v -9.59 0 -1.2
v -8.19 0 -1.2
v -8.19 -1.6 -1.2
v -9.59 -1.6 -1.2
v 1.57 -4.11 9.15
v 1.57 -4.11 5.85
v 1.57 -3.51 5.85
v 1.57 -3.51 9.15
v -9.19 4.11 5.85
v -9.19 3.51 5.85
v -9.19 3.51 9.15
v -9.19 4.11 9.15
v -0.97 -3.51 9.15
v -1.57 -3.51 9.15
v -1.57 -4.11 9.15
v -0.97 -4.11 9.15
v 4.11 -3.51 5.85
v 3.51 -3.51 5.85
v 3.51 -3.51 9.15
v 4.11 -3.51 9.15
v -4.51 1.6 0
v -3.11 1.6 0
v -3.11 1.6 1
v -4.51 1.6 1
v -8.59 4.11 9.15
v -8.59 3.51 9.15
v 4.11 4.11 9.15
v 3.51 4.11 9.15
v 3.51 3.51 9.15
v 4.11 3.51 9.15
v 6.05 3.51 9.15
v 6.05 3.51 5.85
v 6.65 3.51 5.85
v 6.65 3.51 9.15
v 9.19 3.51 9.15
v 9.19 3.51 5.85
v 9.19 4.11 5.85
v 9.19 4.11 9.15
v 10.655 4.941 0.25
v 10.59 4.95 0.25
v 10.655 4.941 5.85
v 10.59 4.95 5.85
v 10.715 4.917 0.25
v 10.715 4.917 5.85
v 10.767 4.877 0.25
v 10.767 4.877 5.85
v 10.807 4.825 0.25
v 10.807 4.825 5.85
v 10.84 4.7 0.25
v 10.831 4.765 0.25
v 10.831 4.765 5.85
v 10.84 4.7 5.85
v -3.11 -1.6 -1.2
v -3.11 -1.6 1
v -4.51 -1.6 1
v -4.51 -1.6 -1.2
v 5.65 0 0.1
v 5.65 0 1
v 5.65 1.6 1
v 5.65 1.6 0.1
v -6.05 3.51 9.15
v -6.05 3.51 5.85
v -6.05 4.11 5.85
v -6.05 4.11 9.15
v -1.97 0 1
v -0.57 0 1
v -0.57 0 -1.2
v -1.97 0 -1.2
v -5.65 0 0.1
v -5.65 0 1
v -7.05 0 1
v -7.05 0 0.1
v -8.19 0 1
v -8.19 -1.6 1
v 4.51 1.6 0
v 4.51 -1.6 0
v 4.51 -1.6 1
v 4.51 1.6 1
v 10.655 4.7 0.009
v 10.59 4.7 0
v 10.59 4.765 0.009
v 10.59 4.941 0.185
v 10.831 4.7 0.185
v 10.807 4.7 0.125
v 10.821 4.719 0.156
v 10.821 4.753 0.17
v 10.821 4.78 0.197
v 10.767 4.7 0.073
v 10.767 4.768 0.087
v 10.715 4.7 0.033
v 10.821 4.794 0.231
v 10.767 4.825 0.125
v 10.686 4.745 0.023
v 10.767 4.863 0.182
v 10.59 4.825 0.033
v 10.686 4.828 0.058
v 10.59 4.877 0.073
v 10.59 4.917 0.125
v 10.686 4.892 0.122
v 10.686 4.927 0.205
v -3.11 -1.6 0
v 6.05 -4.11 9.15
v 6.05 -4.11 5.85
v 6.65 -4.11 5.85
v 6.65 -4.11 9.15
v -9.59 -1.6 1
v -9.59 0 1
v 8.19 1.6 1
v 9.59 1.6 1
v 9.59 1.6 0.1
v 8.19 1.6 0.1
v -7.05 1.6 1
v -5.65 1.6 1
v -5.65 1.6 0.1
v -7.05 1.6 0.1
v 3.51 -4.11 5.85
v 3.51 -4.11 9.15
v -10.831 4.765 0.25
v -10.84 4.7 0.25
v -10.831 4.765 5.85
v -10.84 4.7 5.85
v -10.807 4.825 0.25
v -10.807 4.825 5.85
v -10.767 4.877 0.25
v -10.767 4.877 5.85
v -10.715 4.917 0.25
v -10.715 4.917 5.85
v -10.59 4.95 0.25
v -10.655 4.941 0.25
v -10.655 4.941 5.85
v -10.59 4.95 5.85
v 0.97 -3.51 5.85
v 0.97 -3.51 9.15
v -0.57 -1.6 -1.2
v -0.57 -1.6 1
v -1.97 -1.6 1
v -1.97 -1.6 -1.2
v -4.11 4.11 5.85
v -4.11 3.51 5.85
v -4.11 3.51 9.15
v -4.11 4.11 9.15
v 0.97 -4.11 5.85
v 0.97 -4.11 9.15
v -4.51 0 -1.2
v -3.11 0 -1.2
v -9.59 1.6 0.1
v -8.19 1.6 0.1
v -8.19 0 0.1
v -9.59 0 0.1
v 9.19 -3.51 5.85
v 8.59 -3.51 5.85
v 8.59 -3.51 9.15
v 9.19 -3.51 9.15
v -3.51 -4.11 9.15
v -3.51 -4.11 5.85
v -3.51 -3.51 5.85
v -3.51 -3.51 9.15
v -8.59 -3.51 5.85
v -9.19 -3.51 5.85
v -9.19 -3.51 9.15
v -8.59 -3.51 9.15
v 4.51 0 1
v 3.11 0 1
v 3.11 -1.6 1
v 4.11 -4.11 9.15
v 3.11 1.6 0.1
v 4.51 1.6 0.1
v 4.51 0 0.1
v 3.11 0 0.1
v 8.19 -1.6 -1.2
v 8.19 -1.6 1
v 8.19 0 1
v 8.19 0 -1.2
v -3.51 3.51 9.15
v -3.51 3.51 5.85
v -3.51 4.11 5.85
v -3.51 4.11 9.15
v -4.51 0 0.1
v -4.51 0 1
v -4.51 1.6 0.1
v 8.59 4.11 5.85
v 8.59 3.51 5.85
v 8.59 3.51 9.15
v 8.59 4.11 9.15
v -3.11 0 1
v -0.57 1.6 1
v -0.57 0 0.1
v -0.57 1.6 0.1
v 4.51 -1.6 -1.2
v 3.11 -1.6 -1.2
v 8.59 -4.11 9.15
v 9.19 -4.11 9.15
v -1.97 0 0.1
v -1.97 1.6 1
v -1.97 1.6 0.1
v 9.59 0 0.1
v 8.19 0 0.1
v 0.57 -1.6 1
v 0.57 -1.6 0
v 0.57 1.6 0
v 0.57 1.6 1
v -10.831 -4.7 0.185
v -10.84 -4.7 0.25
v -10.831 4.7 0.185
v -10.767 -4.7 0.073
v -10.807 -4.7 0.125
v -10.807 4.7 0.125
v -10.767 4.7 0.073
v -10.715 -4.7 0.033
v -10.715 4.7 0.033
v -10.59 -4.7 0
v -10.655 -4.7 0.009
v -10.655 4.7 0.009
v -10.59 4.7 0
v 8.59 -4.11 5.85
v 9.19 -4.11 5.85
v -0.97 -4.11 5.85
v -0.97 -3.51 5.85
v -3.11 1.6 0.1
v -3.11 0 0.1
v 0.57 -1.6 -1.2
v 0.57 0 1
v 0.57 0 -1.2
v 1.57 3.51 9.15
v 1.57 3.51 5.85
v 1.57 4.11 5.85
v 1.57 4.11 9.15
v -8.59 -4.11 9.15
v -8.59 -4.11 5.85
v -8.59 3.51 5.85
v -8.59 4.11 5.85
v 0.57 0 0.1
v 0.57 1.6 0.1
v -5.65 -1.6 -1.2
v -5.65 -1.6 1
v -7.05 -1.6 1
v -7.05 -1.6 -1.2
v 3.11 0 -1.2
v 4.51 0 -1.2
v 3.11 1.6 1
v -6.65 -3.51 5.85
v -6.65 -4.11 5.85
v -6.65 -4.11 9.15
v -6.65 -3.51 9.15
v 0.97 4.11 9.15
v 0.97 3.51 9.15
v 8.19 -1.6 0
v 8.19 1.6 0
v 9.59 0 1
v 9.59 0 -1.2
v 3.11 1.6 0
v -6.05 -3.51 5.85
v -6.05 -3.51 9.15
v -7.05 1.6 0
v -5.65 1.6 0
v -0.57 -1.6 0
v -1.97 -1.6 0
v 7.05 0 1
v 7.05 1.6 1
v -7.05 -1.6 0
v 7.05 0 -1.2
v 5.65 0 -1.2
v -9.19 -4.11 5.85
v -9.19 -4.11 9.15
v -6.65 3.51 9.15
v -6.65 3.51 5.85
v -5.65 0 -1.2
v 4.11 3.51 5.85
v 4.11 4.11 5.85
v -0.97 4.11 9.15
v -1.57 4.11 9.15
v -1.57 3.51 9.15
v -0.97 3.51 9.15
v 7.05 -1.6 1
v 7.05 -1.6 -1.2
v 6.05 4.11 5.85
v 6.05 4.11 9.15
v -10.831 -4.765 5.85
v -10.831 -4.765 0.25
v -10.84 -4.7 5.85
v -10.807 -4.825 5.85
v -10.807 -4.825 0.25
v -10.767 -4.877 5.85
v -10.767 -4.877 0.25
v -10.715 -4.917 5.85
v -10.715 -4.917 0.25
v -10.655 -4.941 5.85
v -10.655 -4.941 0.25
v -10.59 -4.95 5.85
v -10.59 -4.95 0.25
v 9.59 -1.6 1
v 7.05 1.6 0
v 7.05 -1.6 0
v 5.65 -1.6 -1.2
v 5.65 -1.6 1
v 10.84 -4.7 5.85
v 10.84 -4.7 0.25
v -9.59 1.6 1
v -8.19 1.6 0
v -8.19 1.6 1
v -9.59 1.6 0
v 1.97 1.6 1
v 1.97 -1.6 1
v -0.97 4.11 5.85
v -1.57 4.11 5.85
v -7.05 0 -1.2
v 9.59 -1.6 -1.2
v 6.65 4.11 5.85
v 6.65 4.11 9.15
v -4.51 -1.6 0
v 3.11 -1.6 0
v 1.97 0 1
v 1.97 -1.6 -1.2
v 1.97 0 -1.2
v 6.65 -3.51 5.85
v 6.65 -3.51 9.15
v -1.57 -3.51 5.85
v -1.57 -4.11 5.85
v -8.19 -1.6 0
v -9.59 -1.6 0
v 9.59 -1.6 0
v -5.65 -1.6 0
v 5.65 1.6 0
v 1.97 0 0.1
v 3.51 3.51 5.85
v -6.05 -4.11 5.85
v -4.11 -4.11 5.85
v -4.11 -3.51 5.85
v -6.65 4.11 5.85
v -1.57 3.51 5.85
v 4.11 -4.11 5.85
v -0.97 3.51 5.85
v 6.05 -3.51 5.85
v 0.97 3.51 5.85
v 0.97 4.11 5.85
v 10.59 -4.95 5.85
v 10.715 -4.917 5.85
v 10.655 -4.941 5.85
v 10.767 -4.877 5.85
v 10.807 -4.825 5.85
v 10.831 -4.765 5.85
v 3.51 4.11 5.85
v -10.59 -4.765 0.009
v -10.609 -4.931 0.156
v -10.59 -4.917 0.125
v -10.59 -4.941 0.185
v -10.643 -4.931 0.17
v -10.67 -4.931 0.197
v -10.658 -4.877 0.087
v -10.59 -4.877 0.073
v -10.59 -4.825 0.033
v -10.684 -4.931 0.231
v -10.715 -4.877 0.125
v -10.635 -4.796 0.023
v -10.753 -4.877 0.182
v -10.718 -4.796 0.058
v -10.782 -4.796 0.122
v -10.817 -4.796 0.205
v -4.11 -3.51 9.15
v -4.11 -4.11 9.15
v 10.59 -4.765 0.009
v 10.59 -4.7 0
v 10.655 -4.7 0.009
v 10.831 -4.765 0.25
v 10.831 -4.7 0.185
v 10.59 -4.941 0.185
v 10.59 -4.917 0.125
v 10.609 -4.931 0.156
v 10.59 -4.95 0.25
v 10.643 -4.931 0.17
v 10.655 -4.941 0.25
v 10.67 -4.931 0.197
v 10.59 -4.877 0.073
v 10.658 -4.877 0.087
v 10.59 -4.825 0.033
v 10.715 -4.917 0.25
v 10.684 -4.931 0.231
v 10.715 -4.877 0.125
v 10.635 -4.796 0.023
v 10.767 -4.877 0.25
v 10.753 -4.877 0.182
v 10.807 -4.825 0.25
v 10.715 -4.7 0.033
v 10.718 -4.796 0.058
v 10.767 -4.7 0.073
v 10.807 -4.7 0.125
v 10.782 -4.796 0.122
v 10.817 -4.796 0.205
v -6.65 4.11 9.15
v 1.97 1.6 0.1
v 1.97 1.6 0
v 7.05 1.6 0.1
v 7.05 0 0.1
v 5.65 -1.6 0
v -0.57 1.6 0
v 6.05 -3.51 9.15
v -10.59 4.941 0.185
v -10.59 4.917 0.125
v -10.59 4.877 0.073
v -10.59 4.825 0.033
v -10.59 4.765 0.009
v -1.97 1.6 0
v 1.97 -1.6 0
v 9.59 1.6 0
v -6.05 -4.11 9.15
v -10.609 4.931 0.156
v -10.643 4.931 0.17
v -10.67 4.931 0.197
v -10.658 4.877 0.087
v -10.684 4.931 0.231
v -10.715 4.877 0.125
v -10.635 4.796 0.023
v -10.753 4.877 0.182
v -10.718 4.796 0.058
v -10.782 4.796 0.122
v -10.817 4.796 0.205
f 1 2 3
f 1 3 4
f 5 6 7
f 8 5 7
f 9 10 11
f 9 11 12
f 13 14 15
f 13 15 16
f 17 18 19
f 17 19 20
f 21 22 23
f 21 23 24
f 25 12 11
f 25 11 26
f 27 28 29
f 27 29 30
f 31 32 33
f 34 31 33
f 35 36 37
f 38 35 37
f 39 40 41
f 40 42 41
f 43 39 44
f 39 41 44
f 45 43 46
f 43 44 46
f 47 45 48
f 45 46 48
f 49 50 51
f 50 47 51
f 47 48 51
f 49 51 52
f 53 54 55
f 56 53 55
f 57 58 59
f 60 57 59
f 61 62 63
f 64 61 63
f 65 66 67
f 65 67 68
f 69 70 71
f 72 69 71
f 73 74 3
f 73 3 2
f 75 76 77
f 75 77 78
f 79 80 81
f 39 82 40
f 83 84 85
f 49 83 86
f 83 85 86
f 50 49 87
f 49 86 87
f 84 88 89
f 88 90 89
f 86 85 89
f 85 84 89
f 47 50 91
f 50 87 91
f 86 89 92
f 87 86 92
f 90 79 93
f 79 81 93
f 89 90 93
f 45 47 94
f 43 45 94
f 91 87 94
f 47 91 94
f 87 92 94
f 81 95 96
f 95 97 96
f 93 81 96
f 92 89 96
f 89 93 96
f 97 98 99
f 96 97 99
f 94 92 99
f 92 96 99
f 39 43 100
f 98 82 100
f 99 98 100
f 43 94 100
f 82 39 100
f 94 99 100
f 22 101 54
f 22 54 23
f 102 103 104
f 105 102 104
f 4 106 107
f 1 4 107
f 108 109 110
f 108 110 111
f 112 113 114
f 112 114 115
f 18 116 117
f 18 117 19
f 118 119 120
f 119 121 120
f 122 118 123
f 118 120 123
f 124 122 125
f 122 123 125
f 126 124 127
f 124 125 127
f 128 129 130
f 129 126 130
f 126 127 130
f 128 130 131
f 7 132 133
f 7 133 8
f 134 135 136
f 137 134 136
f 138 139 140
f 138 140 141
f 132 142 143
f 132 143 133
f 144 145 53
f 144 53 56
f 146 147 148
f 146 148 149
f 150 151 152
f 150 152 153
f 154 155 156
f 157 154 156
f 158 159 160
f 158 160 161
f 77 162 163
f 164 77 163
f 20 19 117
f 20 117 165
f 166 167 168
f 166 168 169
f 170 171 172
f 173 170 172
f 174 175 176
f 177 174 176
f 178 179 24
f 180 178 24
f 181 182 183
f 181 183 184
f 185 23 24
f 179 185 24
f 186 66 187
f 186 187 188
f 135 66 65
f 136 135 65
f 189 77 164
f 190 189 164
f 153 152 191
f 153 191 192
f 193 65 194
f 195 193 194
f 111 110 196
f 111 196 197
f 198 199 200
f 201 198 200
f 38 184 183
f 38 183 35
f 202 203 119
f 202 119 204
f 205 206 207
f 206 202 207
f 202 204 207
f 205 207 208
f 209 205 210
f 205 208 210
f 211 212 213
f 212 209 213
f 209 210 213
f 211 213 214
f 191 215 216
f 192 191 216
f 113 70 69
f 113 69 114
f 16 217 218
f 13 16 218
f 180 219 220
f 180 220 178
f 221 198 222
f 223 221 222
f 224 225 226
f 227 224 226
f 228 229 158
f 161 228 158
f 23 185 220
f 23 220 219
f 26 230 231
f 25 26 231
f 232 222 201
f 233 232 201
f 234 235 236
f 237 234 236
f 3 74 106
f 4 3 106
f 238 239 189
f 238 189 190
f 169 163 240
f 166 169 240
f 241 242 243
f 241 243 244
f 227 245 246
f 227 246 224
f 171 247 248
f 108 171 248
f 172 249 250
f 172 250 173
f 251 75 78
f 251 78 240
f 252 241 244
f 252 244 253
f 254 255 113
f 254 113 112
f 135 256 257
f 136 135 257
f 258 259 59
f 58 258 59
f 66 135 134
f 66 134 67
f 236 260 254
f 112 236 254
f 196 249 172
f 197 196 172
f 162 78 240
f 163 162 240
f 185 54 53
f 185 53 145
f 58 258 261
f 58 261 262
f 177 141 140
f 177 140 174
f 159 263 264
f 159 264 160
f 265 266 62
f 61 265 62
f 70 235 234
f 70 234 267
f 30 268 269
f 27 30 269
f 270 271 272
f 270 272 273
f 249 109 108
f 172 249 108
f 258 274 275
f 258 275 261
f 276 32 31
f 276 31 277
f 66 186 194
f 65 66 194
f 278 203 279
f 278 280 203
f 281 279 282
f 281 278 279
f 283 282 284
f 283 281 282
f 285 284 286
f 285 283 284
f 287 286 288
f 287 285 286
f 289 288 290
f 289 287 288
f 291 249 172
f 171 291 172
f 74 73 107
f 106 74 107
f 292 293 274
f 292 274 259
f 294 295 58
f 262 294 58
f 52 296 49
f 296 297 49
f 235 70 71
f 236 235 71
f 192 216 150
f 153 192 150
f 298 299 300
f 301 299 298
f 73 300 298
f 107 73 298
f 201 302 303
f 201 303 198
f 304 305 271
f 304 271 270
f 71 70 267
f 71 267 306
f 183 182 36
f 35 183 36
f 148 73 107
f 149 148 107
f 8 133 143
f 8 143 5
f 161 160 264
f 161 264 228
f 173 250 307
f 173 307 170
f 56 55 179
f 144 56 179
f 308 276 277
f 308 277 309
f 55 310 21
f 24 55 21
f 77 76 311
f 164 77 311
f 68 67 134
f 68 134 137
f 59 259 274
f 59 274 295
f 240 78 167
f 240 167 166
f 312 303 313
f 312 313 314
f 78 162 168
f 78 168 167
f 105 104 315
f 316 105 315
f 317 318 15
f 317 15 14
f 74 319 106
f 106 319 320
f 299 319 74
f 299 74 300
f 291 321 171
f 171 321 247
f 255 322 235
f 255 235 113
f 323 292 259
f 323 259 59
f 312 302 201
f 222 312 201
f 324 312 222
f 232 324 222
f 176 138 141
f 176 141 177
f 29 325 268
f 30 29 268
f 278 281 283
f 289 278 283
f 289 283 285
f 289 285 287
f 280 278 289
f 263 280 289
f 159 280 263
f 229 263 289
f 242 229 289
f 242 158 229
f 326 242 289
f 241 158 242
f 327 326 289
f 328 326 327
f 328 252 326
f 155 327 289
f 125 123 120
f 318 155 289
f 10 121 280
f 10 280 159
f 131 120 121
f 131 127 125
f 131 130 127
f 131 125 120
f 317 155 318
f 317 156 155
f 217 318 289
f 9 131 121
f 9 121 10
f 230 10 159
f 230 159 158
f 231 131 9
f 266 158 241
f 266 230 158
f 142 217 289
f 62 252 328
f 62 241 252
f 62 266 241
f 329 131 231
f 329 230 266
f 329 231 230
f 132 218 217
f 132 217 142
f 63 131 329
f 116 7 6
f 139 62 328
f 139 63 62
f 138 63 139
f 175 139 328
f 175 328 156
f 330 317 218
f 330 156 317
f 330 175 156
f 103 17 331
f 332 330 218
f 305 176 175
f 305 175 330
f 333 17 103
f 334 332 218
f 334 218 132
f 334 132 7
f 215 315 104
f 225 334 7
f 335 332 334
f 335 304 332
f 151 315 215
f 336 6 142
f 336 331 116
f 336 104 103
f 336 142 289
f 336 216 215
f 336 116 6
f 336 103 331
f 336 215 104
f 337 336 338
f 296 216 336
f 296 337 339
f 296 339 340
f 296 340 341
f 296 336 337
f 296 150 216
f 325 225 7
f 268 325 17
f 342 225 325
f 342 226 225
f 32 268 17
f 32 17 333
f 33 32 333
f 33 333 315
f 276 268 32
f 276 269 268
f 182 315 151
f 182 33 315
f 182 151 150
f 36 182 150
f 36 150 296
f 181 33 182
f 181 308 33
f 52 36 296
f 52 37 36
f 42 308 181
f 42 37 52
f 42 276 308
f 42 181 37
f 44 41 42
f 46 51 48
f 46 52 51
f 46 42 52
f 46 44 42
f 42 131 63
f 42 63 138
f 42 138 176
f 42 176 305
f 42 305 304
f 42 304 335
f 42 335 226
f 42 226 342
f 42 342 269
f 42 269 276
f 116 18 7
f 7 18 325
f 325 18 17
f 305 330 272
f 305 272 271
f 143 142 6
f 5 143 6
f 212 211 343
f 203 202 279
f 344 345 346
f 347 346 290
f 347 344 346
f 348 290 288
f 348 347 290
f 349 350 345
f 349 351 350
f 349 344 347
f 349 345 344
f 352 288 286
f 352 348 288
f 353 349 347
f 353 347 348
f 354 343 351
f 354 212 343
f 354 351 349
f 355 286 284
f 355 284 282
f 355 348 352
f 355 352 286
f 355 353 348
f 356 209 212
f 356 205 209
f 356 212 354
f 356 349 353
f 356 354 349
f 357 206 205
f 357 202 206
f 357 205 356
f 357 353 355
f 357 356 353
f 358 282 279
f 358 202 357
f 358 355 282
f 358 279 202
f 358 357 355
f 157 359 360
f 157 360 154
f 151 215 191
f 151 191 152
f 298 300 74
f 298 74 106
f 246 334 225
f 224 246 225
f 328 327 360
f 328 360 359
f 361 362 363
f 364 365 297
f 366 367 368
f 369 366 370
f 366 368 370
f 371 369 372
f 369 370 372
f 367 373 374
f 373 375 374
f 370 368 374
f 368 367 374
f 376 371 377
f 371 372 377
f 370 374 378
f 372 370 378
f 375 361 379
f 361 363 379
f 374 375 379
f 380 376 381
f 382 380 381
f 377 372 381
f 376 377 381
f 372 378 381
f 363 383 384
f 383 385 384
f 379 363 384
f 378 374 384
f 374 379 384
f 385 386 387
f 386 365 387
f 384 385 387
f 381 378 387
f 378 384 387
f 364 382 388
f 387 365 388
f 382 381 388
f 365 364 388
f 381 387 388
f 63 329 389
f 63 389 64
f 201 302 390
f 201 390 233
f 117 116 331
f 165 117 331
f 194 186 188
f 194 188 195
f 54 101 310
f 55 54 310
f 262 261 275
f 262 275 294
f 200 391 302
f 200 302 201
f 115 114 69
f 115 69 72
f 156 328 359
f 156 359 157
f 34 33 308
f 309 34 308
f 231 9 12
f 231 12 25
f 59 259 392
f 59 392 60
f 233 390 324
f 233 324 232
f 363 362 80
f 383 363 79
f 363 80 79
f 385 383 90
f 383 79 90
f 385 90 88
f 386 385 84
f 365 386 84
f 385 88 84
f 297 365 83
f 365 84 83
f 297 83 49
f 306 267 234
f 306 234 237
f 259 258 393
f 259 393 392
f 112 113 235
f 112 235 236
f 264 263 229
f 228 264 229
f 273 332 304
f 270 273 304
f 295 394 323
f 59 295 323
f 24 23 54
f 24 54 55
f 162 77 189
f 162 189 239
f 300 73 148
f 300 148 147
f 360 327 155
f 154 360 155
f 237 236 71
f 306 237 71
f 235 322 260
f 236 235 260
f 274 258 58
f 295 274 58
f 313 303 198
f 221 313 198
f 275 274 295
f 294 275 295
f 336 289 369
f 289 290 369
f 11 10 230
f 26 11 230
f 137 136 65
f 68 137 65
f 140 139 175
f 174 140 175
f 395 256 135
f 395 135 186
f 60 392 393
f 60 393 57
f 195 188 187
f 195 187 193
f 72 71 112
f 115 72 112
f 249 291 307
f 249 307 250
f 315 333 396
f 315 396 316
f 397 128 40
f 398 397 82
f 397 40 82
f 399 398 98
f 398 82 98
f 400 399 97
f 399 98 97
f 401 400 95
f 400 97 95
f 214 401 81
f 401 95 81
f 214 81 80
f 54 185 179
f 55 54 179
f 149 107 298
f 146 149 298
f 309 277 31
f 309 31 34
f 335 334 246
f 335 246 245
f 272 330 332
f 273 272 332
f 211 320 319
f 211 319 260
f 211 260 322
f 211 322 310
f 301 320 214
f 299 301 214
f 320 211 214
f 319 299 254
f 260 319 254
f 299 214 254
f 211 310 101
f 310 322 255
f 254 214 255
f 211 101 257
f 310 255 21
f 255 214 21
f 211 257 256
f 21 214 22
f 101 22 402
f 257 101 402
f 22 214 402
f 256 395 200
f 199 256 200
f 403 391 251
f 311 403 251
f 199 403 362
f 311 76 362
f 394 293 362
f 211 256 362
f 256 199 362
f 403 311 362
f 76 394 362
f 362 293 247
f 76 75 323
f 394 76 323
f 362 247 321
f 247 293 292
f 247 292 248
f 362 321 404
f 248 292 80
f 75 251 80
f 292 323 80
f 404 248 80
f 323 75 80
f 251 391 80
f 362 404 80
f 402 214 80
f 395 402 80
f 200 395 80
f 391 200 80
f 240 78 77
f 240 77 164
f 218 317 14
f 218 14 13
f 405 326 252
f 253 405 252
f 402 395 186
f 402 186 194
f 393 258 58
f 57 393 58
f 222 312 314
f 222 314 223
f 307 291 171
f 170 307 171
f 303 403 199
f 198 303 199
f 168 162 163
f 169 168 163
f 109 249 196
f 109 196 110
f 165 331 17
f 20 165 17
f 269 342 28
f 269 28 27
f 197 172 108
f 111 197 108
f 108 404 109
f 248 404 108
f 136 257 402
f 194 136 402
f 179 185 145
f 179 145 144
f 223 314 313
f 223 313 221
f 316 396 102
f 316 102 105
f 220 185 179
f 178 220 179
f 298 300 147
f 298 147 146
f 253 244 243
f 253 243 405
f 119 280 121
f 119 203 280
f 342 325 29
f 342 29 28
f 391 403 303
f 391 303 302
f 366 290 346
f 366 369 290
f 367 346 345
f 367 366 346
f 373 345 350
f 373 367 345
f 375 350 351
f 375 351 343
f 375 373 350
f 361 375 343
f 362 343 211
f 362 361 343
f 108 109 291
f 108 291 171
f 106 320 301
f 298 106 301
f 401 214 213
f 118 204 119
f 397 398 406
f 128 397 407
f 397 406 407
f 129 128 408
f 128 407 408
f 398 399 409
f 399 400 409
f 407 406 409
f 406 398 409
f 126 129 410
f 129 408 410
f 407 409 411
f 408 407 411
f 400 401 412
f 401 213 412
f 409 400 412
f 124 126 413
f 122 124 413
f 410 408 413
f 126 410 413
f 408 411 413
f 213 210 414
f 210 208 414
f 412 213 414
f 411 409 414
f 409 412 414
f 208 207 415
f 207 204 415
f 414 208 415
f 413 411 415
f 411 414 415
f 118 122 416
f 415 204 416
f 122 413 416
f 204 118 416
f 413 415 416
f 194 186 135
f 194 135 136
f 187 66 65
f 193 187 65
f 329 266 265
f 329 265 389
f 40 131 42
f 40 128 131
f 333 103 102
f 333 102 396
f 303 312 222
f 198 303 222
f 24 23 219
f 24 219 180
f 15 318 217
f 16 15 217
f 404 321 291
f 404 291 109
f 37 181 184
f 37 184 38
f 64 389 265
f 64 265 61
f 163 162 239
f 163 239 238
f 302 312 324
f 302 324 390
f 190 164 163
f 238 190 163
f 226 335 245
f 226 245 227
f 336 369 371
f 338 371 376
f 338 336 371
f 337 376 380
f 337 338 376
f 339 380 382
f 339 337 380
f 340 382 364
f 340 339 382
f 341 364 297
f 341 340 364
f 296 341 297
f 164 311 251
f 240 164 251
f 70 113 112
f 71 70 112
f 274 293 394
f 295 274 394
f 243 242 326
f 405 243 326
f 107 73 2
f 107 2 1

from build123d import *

# Parameters (mm, degrees)
IZIM1_W                       = 21.68
IZIM1_H                       = 9.9
Y_KSEKLIK_EKSTR_ZYON1_DEPTH   = 5.85
IZIM2_W                       = 1.4
IZIM2_H                       = 3.2
KES_EKSTR_ZYON1_DEPTH         = 1
IZIM3_W                       = 1.4
IZIM3_H                       = 1.6
Y_KSEKLIK_EKSTR_ZYON2_DEPTH   = 2.2
Y_KSEKLIK_EKSTR_ZYON2_2_DEPTH = 2.2
Y_KSEKLIK_EKSTR_ZYON2_3_DEPTH = 2.2
Y_KSEKLIK_EKSTR_ZYON2_4_DEPTH = 2.2
Y_KSEKLIK_EKSTR_ZYON2_5_DEPTH = 2.2
Y_KSEKLIK_EKSTR_ZYON2_6_DEPTH = 2.2
Y_KSEKLIK_EKSTR_ZYON2_7_DEPTH = 2.2
Y_KSEKLIK_EKSTR_ZYON2_8_DEPTH = 2.2
IZIM4_W                       = 1.4
IZIM4_H                       = 1.6
Y_KSEKLIK_EKSTR_ZYON3_DEPTH   = 0.9
Y_KSEKLIK_EKSTR_ZYON3_2_DEPTH = 0.9
Y_KSEKLIK_EKSTR_ZYON3_3_DEPTH = 0.9
Y_KSEKLIK_EKSTR_ZYON3_4_DEPTH = 0.9
Y_KSEKLIK_EKSTR_ZYON3_5_DEPTH = 0.9
Y_KSEKLIK_EKSTR_ZYON3_6_DEPTH = 0.9
Y_KSEKLIK_EKSTR_ZYON3_7_DEPTH = 0.9
Y_KSEKLIK_EKSTR_ZYON3_8_DEPTH = 0.9
RADYUS1_R                     = 0.25
IZIM5_W                       = 0.6
IZIM5_H                       = 0.6
Y_KSEKLIK_EKSTR_ZYON4_DEPTH   = 3.3


with BuildPart() as part:
    # Çizim1 → Yükseklik-Ekstrüzyon1 (new body)
    with BuildSketch(Plane.XY):
        Rectangle(IZIM1_W, IZIM1_H)
    extrude(amount=Y_KSEKLIK_EKSTR_ZYON1_DEPTH)

    # Çizim2 → Kes-Ekstrüzyon1 (cut)
    with BuildSketch(Plane(origin=(0, 0, 0), x_dir=(-1, 0, 0), z_dir=(0, 0, -1))):
        with Locations((-8.89, 0)):
            Rectangle(IZIM2_W, IZIM2_H)
        with Locations((-6.35, 0)):
            Rectangle(IZIM2_W, IZIM2_H)
        with Locations((-3.81, 0)):
            Rectangle(IZIM2_W, IZIM2_H)
        with Locations((-1.27, 0)):
            Rectangle(IZIM2_W, IZIM2_H)
        with Locations((1.27, 0)):
            Rectangle(IZIM2_W, IZIM2_H)
        with Locations((3.81, 0)):
            Rectangle(IZIM2_W, IZIM2_H)
        with Locations((6.35, 0)):
            Rectangle(IZIM2_W, IZIM2_H)
        with Locations((8.89, 0)):
            Rectangle(IZIM2_W, IZIM2_H)
    extrude(amount=-KES_EKSTR_ZYON1_DEPTH, mode=Mode.SUBTRACT)

    # Radyus1
    radyus1_edges = [part.edges().sort_by_distance(p)[0] for p in [
        (-10.84, 0, 0),
        (0, 4.95, 0),
        (10.84, 0, 0),
        (0, -4.95, 0),
        (-10.84, -4.95, 2.925),
        (-10.84, 4.95, 2.925),
        (10.84, 4.95, 2.925),
        (10.84, -4.95, 2.925),
    ]]
    fillet(radyus1_edges, radius=RADYUS1_R)

    # Çizim5 → Yükseklik-Ekstrüzyon4 (add)
    with BuildSketch(Plane.XY.offset(5.85)):
        with Locations((-8.89, 3.81)):
            Rectangle(IZIM5_W, IZIM5_H)
        with Locations((-6.35, 3.81)):
            Rectangle(IZIM5_W, IZIM5_H)
        with Locations((-3.81, 3.81)):
            Rectangle(IZIM5_W, IZIM5_H)
        with Locations((-1.27, 3.81)):
            Rectangle(IZIM5_W, IZIM5_H)
        with Locations((1.27, 3.81)):
            Rectangle(IZIM5_W, IZIM5_H)
        with Locations((3.81, 3.81)):
            Rectangle(IZIM5_W, IZIM5_H)
        with Locations((6.35, 3.81)):
            Rectangle(IZIM5_W, IZIM5_H)
        with Locations((8.89, 3.81)):
            Rectangle(IZIM5_W, IZIM5_H)
        with Locations((8.89, -3.81)):
            Rectangle(IZIM5_W, IZIM5_H)
        with Locations((6.35, -3.81)):
            Rectangle(IZIM5_W, IZIM5_H)
        with Locations((3.81, -3.81)):
            Rectangle(IZIM5_W, IZIM5_H)
        with Locations((1.27, -3.81)):
            Rectangle(IZIM5_W, IZIM5_H)
        with Locations((-1.27, -3.81)):
            Rectangle(IZIM5_W, IZIM5_H)
        with Locations((-3.81, -3.81)):
            Rectangle(IZIM5_W, IZIM5_H)
        with Locations((-6.35, -3.81)):
            Rectangle(IZIM5_W, IZIM5_H)
        with Locations((-8.89, -3.81)):
            Rectangle(IZIM5_W, IZIM5_H)
    extrude(amount=Y_KSEKLIK_EKSTR_ZYON4_DEPTH)


with BuildPart() as body_2:
    # Çizim3 → Yükseklik-Ekstrüzyon2 (new body)
    with BuildSketch(Plane(origin=(0, 0, 1), x_dir=(-1, 0, 0), z_dir=(0, 0, -1))):
        with Locations((-8.89, -0.8)):
            Rectangle(IZIM3_W, IZIM3_H)
    extrude(amount=Y_KSEKLIK_EKSTR_ZYON2_DEPTH)


with BuildPart() as body_3:
    # Çizim3 → Y_kseklik-Ekstr_zyon2 2 (new body)
    with BuildSketch(Plane(origin=(0, 0, 1), x_dir=(-1, 0, 0), z_dir=(0, 0, -1))):
        with Locations((-6.35, -0.8)):
            Rectangle(IZIM3_W, IZIM3_H)
    extrude(amount=Y_KSEKLIK_EKSTR_ZYON2_2_DEPTH)


with BuildPart() as body_4:
    # Çizim3 → Y_kseklik-Ekstr_zyon2 3 (new body)
    with BuildSketch(Plane(origin=(0, 0, 1), x_dir=(-1, 0, 0), z_dir=(0, 0, -1))):
        with Locations((-3.81, -0.8)):
            Rectangle(IZIM3_W, IZIM3_H)
    extrude(amount=Y_KSEKLIK_EKSTR_ZYON2_3_DEPTH)


with BuildPart() as body_5:
    # Çizim3 → Y_kseklik-Ekstr_zyon2 4 (new body)
    with BuildSketch(Plane(origin=(0, 0, 1), x_dir=(-1, 0, 0), z_dir=(0, 0, -1))):
        with Locations((-1.27, -0.8)):
            Rectangle(IZIM3_W, IZIM3_H)
    extrude(amount=Y_KSEKLIK_EKSTR_ZYON2_4_DEPTH)


with BuildPart() as body_6:
    # Çizim3 → Y_kseklik-Ekstr_zyon2 5 (new body)
    with BuildSketch(Plane(origin=(0, 0, 1), x_dir=(-1, 0, 0), z_dir=(0, 0, -1))):
        with Locations((1.27, -0.8)):
            Rectangle(IZIM3_W, IZIM3_H)
    extrude(amount=Y_KSEKLIK_EKSTR_ZYON2_5_DEPTH)


with BuildPart() as body_7:
    # Çizim3 → Y_kseklik-Ekstr_zyon2 6 (new body)
    with BuildSketch(Plane(origin=(0, 0, 1), x_dir=(-1, 0, 0), z_dir=(0, 0, -1))):
        with Locations((3.81, -0.8)):
            Rectangle(IZIM3_W, IZIM3_H)
    extrude(amount=Y_KSEKLIK_EKSTR_ZYON2_6_DEPTH)


with BuildPart() as body_8:
    # Çizim3 → Y_kseklik-Ekstr_zyon2 7 (new body)
    with BuildSketch(Plane(origin=(0, 0, 1), x_dir=(-1, 0, 0), z_dir=(0, 0, -1))):
        with Locations((6.35, -0.8)):
            Rectangle(IZIM3_W, IZIM3_H)
    extrude(amount=Y_KSEKLIK_EKSTR_ZYON2_7_DEPTH)


with BuildPart() as body_9:
    # Çizim3 → Y_kseklik-Ekstr_zyon2 8 (new body)
    with BuildSketch(Plane(origin=(0, 0, 1), x_dir=(-1, 0, 0), z_dir=(0, 0, -1))):
        with Locations((8.89, -0.8)):
            Rectangle(IZIM3_W, IZIM3_H)
    extrude(amount=Y_KSEKLIK_EKSTR_ZYON2_8_DEPTH)


with BuildPart() as body_10:
    # Çizim4 → Yükseklik-Ekstrüzyon3 (new body)
    with BuildSketch(Plane(origin=(0, 0, 1), x_dir=(-1, 0, 0), z_dir=(0, 0, -1))):
        with Locations((-8.89, 0.8)):
            Rectangle(IZIM4_W, IZIM4_H)
    extrude(amount=Y_KSEKLIK_EKSTR_ZYON3_DEPTH)


with BuildPart() as body_11:
    # Çizim4 → Y_kseklik-Ekstr_zyon3 2 (new body)
    with BuildSketch(Plane(origin=(0, 0, 1), x_dir=(-1, 0, 0), z_dir=(0, 0, -1))):
        with Locations((-6.35, 0.8)):
            Rectangle(IZIM4_W, IZIM4_H)
    extrude(amount=Y_KSEKLIK_EKSTR_ZYON3_2_DEPTH)


with BuildPart() as body_12:
    # Çizim4 → Y_kseklik-Ekstr_zyon3 3 (new body)
    with BuildSketch(Plane(origin=(0, 0, 1), x_dir=(-1, 0, 0), z_dir=(0, 0, -1))):
        with Locations((-3.81, 0.8)):
            Rectangle(IZIM4_W, IZIM4_H)
    extrude(amount=Y_KSEKLIK_EKSTR_ZYON3_3_DEPTH)


with BuildPart() as body_13:
    # Çizim4 → Y_kseklik-Ekstr_zyon3 4 (new body)
    with BuildSketch(Plane(origin=(0, 0, 1), x_dir=(-1, 0, 0), z_dir=(0, 0, -1))):
        with Locations((-1.27, 0.8)):
            Rectangle(IZIM4_W, IZIM4_H)
    extrude(amount=Y_KSEKLIK_EKSTR_ZYON3_4_DEPTH)


with BuildPart() as body_14:
    # Çizim4 → Y_kseklik-Ekstr_zyon3 5 (new body)
    with BuildSketch(Plane(origin=(0, 0, 1), x_dir=(-1, 0, 0), z_dir=(0, 0, -1))):
        with Locations((1.27, 0.8)):
            Rectangle(IZIM4_W, IZIM4_H)
    extrude(amount=Y_KSEKLIK_EKSTR_ZYON3_5_DEPTH)


with BuildPart() as body_15:
    # Çizim4 → Y_kseklik-Ekstr_zyon3 6 (new body)
    with BuildSketch(Plane(origin=(0, 0, 1), x_dir=(-1, 0, 0), z_dir=(0, 0, -1))):
        with Locations((3.81, 0.8)):
            Rectangle(IZIM4_W, IZIM4_H)
    extrude(amount=Y_KSEKLIK_EKSTR_ZYON3_6_DEPTH)


with BuildPart() as body_16:
    # Çizim4 → Y_kseklik-Ekstr_zyon3 7 (new body)
    with BuildSketch(Plane(origin=(0, 0, 1), x_dir=(-1, 0, 0), z_dir=(0, 0, -1))):
        with Locations((6.35, 0.8)):
            Rectangle(IZIM4_W, IZIM4_H)
    extrude(amount=Y_KSEKLIK_EKSTR_ZYON3_7_DEPTH)


with BuildPart() as body_17:
    # Çizim4 → Y_kseklik-Ekstr_zyon3 8 (new body)
    with BuildSketch(Plane(origin=(0, 0, 1), x_dir=(-1, 0, 0), z_dir=(0, 0, -1))):
        with Locations((8.89, 0.8)):
            Rectangle(IZIM4_W, IZIM4_H)
    extrude(amount=Y_KSEKLIK_EKSTR_ZYON3_8_DEPTH)


solid = Compound([part.part, body_2.part, body_3.part, body_4.part, body_5.part, body_6.part, body_7.part, body_8.part, body_9.part, body_10.part, body_11.part, body_12.part, body_13.part, body_14.part, body_15.part, body_16.part, body_17.part])
